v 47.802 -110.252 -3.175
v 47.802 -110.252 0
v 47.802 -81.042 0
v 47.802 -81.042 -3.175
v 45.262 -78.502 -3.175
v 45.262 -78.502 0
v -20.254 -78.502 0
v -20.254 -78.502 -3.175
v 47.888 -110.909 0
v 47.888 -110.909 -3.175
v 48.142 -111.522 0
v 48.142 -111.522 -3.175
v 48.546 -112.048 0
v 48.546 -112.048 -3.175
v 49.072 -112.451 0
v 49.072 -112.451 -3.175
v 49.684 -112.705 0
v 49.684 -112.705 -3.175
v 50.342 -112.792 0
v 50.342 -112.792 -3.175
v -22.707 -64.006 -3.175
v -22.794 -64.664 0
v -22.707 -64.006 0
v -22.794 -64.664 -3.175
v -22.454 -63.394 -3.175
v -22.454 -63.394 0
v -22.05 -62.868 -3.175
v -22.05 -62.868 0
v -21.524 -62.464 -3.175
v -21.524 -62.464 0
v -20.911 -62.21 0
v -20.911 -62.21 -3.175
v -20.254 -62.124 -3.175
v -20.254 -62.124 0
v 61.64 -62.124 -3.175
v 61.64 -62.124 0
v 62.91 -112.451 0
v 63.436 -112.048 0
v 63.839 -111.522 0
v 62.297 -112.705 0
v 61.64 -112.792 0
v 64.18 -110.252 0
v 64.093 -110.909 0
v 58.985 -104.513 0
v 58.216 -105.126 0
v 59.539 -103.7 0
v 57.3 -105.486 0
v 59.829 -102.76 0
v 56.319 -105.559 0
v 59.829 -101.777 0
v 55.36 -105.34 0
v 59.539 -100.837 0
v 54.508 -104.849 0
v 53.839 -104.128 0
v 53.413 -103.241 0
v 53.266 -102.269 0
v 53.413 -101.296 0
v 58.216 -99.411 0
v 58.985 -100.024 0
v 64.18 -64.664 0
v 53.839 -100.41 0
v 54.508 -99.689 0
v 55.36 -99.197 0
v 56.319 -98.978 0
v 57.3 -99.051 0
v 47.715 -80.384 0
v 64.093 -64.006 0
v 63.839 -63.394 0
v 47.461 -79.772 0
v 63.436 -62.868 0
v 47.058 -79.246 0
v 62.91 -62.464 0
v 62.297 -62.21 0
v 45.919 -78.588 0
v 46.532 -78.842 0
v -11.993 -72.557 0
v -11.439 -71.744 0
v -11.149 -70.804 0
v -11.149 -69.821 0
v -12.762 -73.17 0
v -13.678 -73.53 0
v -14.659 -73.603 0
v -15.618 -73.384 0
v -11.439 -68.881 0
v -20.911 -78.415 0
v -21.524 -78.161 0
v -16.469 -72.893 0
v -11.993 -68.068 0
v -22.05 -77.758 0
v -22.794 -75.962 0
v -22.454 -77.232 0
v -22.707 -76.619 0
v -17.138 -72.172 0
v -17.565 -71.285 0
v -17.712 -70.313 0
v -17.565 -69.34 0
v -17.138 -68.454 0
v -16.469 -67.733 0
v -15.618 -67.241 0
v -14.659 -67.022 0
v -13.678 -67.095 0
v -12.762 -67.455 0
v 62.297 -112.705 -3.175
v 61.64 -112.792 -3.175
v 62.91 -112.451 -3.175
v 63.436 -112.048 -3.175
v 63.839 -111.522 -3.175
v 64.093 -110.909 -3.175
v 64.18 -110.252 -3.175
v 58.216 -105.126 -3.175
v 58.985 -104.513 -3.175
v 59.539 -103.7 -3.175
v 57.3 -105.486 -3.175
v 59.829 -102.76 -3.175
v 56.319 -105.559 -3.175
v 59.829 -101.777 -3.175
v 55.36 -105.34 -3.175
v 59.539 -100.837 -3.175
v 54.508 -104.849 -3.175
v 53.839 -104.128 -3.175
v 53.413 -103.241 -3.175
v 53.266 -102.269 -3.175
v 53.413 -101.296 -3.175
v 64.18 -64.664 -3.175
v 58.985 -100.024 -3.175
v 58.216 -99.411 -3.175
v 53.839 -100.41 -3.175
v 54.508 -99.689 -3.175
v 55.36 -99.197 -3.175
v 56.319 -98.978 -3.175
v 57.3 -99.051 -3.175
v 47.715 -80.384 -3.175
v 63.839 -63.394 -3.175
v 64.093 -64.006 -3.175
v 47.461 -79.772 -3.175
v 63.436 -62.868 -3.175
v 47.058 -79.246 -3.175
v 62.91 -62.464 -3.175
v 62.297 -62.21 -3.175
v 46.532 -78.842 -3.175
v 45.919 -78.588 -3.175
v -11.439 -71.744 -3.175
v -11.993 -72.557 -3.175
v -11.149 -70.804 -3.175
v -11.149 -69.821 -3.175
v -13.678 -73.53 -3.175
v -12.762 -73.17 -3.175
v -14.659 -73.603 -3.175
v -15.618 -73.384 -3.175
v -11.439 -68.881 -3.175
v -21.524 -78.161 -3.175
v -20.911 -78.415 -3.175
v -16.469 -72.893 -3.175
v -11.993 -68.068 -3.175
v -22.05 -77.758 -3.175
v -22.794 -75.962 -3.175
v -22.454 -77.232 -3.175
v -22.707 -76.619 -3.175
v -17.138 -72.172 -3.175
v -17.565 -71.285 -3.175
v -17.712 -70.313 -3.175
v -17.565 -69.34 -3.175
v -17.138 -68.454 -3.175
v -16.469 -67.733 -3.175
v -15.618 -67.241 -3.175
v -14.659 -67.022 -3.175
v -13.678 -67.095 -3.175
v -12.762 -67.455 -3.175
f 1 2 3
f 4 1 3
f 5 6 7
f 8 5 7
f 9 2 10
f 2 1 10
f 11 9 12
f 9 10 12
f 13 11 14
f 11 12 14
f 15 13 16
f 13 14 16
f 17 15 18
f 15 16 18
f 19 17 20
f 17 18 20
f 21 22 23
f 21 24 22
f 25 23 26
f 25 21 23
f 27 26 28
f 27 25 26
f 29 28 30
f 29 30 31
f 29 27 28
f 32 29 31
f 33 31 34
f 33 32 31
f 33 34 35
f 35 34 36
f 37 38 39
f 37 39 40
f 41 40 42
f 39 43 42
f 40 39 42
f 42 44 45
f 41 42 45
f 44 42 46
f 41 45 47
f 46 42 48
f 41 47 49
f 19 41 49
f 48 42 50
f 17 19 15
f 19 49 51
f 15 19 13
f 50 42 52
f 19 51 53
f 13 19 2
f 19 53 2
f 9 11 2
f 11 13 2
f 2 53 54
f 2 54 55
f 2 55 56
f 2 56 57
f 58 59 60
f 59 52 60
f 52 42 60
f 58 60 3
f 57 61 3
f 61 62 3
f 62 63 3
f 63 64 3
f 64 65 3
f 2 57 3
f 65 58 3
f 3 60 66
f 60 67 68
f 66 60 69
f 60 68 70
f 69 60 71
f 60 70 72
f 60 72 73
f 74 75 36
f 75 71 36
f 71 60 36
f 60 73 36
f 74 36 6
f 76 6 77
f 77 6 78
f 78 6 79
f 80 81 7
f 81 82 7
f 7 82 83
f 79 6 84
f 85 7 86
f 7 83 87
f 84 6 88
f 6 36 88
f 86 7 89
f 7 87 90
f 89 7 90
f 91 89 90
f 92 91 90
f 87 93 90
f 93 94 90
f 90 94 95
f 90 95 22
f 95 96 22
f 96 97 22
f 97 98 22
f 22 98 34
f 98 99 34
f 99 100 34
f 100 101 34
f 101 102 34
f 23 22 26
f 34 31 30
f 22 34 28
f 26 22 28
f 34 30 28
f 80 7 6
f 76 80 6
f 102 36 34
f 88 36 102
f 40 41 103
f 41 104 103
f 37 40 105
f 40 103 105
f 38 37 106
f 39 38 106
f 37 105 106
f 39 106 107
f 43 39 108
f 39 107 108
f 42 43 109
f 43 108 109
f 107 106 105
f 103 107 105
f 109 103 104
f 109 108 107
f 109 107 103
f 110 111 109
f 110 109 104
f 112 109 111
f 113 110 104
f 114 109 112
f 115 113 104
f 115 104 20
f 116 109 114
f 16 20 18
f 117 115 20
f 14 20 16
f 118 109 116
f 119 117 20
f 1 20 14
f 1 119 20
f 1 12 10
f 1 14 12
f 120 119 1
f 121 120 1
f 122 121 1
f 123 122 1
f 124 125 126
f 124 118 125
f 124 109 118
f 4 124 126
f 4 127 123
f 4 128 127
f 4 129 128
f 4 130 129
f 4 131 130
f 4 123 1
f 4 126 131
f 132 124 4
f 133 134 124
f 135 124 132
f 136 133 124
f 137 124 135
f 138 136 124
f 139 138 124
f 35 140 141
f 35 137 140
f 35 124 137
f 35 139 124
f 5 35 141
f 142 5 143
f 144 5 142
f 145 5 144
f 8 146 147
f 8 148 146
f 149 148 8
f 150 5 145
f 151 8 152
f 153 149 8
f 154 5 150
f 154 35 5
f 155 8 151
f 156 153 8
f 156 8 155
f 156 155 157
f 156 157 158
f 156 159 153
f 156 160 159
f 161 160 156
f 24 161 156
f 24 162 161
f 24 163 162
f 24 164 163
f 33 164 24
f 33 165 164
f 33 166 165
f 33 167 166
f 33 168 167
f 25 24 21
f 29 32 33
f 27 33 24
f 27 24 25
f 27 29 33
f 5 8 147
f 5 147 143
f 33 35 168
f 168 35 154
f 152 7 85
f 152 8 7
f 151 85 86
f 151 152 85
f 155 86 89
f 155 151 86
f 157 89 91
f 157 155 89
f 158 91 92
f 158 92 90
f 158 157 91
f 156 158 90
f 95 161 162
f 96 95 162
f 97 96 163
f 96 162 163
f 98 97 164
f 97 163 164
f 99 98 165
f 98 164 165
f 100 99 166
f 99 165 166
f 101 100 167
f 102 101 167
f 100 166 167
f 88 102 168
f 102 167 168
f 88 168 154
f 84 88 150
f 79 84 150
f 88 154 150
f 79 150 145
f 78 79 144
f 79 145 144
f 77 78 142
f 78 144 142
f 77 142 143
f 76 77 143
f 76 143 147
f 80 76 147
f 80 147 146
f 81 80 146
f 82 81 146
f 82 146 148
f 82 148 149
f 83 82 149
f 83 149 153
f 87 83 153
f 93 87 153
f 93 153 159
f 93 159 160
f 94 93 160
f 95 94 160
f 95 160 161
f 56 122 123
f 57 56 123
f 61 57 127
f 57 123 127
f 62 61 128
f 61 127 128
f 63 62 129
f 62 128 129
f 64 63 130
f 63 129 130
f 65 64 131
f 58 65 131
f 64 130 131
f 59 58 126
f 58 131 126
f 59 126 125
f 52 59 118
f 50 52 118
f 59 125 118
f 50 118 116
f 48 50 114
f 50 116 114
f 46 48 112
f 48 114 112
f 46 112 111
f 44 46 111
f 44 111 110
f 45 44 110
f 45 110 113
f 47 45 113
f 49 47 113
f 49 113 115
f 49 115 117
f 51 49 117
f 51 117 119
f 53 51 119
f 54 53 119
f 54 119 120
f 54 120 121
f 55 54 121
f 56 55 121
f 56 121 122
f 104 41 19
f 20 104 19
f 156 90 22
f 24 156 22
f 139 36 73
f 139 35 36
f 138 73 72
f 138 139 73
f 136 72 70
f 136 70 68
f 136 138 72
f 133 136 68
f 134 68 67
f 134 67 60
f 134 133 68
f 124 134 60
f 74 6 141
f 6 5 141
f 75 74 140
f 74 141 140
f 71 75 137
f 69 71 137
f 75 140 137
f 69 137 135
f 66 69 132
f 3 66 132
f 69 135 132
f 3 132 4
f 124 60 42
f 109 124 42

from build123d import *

# Parameters (mm, degrees)
BASE_FLANGE1_DEPTH   = 3.175
M6_CLEARANCE_HOLE1_D = 6.6
FILLET1_R            = 2.54


# Sheet-metal steps are written as plain solids
with BuildPart() as part:
    # Sketch1 → Base-Flange1 (new body)
    with BuildSketch(Plane.XY):
        Polygon((47.801569048, -78.501600001), (-22.7939, -78.501600001), (-22.7939, -62.123600001), (64.179569048, -62.123600001), (64.179569048, -112.791600001), (47.801569048, -112.791600001), align=None)
    extrude(amount=-BASE_FLANGE1_DEPTH)

    # M6 Clearance Hole1 (through all)
    with Locations(Plane.XY):
        with Locations((56.565919048, -102.268610498), (-14.4119, -70.312600001)):
            Hole(M6_CLEARANCE_HOLE1_D / 2)

    # Fillet1
    fillet1_edges = [part.edges().sort_by_distance(p)[0] for p in [
        (-22.7939, -62.123600001, -1.5875),
        (64.179569048, -62.123600001, -1.5875),
        (64.179569048, -112.791600001, -1.5875),
        (47.801569048, -112.791600001, -1.5875),
        (47.801569048, -78.501600001, -1.5875),
        (-22.7939, -78.501600001, -1.5875),
    ]]
    fillet(fillet1_edges, radius=FILLET1_R)


solid = part.part
